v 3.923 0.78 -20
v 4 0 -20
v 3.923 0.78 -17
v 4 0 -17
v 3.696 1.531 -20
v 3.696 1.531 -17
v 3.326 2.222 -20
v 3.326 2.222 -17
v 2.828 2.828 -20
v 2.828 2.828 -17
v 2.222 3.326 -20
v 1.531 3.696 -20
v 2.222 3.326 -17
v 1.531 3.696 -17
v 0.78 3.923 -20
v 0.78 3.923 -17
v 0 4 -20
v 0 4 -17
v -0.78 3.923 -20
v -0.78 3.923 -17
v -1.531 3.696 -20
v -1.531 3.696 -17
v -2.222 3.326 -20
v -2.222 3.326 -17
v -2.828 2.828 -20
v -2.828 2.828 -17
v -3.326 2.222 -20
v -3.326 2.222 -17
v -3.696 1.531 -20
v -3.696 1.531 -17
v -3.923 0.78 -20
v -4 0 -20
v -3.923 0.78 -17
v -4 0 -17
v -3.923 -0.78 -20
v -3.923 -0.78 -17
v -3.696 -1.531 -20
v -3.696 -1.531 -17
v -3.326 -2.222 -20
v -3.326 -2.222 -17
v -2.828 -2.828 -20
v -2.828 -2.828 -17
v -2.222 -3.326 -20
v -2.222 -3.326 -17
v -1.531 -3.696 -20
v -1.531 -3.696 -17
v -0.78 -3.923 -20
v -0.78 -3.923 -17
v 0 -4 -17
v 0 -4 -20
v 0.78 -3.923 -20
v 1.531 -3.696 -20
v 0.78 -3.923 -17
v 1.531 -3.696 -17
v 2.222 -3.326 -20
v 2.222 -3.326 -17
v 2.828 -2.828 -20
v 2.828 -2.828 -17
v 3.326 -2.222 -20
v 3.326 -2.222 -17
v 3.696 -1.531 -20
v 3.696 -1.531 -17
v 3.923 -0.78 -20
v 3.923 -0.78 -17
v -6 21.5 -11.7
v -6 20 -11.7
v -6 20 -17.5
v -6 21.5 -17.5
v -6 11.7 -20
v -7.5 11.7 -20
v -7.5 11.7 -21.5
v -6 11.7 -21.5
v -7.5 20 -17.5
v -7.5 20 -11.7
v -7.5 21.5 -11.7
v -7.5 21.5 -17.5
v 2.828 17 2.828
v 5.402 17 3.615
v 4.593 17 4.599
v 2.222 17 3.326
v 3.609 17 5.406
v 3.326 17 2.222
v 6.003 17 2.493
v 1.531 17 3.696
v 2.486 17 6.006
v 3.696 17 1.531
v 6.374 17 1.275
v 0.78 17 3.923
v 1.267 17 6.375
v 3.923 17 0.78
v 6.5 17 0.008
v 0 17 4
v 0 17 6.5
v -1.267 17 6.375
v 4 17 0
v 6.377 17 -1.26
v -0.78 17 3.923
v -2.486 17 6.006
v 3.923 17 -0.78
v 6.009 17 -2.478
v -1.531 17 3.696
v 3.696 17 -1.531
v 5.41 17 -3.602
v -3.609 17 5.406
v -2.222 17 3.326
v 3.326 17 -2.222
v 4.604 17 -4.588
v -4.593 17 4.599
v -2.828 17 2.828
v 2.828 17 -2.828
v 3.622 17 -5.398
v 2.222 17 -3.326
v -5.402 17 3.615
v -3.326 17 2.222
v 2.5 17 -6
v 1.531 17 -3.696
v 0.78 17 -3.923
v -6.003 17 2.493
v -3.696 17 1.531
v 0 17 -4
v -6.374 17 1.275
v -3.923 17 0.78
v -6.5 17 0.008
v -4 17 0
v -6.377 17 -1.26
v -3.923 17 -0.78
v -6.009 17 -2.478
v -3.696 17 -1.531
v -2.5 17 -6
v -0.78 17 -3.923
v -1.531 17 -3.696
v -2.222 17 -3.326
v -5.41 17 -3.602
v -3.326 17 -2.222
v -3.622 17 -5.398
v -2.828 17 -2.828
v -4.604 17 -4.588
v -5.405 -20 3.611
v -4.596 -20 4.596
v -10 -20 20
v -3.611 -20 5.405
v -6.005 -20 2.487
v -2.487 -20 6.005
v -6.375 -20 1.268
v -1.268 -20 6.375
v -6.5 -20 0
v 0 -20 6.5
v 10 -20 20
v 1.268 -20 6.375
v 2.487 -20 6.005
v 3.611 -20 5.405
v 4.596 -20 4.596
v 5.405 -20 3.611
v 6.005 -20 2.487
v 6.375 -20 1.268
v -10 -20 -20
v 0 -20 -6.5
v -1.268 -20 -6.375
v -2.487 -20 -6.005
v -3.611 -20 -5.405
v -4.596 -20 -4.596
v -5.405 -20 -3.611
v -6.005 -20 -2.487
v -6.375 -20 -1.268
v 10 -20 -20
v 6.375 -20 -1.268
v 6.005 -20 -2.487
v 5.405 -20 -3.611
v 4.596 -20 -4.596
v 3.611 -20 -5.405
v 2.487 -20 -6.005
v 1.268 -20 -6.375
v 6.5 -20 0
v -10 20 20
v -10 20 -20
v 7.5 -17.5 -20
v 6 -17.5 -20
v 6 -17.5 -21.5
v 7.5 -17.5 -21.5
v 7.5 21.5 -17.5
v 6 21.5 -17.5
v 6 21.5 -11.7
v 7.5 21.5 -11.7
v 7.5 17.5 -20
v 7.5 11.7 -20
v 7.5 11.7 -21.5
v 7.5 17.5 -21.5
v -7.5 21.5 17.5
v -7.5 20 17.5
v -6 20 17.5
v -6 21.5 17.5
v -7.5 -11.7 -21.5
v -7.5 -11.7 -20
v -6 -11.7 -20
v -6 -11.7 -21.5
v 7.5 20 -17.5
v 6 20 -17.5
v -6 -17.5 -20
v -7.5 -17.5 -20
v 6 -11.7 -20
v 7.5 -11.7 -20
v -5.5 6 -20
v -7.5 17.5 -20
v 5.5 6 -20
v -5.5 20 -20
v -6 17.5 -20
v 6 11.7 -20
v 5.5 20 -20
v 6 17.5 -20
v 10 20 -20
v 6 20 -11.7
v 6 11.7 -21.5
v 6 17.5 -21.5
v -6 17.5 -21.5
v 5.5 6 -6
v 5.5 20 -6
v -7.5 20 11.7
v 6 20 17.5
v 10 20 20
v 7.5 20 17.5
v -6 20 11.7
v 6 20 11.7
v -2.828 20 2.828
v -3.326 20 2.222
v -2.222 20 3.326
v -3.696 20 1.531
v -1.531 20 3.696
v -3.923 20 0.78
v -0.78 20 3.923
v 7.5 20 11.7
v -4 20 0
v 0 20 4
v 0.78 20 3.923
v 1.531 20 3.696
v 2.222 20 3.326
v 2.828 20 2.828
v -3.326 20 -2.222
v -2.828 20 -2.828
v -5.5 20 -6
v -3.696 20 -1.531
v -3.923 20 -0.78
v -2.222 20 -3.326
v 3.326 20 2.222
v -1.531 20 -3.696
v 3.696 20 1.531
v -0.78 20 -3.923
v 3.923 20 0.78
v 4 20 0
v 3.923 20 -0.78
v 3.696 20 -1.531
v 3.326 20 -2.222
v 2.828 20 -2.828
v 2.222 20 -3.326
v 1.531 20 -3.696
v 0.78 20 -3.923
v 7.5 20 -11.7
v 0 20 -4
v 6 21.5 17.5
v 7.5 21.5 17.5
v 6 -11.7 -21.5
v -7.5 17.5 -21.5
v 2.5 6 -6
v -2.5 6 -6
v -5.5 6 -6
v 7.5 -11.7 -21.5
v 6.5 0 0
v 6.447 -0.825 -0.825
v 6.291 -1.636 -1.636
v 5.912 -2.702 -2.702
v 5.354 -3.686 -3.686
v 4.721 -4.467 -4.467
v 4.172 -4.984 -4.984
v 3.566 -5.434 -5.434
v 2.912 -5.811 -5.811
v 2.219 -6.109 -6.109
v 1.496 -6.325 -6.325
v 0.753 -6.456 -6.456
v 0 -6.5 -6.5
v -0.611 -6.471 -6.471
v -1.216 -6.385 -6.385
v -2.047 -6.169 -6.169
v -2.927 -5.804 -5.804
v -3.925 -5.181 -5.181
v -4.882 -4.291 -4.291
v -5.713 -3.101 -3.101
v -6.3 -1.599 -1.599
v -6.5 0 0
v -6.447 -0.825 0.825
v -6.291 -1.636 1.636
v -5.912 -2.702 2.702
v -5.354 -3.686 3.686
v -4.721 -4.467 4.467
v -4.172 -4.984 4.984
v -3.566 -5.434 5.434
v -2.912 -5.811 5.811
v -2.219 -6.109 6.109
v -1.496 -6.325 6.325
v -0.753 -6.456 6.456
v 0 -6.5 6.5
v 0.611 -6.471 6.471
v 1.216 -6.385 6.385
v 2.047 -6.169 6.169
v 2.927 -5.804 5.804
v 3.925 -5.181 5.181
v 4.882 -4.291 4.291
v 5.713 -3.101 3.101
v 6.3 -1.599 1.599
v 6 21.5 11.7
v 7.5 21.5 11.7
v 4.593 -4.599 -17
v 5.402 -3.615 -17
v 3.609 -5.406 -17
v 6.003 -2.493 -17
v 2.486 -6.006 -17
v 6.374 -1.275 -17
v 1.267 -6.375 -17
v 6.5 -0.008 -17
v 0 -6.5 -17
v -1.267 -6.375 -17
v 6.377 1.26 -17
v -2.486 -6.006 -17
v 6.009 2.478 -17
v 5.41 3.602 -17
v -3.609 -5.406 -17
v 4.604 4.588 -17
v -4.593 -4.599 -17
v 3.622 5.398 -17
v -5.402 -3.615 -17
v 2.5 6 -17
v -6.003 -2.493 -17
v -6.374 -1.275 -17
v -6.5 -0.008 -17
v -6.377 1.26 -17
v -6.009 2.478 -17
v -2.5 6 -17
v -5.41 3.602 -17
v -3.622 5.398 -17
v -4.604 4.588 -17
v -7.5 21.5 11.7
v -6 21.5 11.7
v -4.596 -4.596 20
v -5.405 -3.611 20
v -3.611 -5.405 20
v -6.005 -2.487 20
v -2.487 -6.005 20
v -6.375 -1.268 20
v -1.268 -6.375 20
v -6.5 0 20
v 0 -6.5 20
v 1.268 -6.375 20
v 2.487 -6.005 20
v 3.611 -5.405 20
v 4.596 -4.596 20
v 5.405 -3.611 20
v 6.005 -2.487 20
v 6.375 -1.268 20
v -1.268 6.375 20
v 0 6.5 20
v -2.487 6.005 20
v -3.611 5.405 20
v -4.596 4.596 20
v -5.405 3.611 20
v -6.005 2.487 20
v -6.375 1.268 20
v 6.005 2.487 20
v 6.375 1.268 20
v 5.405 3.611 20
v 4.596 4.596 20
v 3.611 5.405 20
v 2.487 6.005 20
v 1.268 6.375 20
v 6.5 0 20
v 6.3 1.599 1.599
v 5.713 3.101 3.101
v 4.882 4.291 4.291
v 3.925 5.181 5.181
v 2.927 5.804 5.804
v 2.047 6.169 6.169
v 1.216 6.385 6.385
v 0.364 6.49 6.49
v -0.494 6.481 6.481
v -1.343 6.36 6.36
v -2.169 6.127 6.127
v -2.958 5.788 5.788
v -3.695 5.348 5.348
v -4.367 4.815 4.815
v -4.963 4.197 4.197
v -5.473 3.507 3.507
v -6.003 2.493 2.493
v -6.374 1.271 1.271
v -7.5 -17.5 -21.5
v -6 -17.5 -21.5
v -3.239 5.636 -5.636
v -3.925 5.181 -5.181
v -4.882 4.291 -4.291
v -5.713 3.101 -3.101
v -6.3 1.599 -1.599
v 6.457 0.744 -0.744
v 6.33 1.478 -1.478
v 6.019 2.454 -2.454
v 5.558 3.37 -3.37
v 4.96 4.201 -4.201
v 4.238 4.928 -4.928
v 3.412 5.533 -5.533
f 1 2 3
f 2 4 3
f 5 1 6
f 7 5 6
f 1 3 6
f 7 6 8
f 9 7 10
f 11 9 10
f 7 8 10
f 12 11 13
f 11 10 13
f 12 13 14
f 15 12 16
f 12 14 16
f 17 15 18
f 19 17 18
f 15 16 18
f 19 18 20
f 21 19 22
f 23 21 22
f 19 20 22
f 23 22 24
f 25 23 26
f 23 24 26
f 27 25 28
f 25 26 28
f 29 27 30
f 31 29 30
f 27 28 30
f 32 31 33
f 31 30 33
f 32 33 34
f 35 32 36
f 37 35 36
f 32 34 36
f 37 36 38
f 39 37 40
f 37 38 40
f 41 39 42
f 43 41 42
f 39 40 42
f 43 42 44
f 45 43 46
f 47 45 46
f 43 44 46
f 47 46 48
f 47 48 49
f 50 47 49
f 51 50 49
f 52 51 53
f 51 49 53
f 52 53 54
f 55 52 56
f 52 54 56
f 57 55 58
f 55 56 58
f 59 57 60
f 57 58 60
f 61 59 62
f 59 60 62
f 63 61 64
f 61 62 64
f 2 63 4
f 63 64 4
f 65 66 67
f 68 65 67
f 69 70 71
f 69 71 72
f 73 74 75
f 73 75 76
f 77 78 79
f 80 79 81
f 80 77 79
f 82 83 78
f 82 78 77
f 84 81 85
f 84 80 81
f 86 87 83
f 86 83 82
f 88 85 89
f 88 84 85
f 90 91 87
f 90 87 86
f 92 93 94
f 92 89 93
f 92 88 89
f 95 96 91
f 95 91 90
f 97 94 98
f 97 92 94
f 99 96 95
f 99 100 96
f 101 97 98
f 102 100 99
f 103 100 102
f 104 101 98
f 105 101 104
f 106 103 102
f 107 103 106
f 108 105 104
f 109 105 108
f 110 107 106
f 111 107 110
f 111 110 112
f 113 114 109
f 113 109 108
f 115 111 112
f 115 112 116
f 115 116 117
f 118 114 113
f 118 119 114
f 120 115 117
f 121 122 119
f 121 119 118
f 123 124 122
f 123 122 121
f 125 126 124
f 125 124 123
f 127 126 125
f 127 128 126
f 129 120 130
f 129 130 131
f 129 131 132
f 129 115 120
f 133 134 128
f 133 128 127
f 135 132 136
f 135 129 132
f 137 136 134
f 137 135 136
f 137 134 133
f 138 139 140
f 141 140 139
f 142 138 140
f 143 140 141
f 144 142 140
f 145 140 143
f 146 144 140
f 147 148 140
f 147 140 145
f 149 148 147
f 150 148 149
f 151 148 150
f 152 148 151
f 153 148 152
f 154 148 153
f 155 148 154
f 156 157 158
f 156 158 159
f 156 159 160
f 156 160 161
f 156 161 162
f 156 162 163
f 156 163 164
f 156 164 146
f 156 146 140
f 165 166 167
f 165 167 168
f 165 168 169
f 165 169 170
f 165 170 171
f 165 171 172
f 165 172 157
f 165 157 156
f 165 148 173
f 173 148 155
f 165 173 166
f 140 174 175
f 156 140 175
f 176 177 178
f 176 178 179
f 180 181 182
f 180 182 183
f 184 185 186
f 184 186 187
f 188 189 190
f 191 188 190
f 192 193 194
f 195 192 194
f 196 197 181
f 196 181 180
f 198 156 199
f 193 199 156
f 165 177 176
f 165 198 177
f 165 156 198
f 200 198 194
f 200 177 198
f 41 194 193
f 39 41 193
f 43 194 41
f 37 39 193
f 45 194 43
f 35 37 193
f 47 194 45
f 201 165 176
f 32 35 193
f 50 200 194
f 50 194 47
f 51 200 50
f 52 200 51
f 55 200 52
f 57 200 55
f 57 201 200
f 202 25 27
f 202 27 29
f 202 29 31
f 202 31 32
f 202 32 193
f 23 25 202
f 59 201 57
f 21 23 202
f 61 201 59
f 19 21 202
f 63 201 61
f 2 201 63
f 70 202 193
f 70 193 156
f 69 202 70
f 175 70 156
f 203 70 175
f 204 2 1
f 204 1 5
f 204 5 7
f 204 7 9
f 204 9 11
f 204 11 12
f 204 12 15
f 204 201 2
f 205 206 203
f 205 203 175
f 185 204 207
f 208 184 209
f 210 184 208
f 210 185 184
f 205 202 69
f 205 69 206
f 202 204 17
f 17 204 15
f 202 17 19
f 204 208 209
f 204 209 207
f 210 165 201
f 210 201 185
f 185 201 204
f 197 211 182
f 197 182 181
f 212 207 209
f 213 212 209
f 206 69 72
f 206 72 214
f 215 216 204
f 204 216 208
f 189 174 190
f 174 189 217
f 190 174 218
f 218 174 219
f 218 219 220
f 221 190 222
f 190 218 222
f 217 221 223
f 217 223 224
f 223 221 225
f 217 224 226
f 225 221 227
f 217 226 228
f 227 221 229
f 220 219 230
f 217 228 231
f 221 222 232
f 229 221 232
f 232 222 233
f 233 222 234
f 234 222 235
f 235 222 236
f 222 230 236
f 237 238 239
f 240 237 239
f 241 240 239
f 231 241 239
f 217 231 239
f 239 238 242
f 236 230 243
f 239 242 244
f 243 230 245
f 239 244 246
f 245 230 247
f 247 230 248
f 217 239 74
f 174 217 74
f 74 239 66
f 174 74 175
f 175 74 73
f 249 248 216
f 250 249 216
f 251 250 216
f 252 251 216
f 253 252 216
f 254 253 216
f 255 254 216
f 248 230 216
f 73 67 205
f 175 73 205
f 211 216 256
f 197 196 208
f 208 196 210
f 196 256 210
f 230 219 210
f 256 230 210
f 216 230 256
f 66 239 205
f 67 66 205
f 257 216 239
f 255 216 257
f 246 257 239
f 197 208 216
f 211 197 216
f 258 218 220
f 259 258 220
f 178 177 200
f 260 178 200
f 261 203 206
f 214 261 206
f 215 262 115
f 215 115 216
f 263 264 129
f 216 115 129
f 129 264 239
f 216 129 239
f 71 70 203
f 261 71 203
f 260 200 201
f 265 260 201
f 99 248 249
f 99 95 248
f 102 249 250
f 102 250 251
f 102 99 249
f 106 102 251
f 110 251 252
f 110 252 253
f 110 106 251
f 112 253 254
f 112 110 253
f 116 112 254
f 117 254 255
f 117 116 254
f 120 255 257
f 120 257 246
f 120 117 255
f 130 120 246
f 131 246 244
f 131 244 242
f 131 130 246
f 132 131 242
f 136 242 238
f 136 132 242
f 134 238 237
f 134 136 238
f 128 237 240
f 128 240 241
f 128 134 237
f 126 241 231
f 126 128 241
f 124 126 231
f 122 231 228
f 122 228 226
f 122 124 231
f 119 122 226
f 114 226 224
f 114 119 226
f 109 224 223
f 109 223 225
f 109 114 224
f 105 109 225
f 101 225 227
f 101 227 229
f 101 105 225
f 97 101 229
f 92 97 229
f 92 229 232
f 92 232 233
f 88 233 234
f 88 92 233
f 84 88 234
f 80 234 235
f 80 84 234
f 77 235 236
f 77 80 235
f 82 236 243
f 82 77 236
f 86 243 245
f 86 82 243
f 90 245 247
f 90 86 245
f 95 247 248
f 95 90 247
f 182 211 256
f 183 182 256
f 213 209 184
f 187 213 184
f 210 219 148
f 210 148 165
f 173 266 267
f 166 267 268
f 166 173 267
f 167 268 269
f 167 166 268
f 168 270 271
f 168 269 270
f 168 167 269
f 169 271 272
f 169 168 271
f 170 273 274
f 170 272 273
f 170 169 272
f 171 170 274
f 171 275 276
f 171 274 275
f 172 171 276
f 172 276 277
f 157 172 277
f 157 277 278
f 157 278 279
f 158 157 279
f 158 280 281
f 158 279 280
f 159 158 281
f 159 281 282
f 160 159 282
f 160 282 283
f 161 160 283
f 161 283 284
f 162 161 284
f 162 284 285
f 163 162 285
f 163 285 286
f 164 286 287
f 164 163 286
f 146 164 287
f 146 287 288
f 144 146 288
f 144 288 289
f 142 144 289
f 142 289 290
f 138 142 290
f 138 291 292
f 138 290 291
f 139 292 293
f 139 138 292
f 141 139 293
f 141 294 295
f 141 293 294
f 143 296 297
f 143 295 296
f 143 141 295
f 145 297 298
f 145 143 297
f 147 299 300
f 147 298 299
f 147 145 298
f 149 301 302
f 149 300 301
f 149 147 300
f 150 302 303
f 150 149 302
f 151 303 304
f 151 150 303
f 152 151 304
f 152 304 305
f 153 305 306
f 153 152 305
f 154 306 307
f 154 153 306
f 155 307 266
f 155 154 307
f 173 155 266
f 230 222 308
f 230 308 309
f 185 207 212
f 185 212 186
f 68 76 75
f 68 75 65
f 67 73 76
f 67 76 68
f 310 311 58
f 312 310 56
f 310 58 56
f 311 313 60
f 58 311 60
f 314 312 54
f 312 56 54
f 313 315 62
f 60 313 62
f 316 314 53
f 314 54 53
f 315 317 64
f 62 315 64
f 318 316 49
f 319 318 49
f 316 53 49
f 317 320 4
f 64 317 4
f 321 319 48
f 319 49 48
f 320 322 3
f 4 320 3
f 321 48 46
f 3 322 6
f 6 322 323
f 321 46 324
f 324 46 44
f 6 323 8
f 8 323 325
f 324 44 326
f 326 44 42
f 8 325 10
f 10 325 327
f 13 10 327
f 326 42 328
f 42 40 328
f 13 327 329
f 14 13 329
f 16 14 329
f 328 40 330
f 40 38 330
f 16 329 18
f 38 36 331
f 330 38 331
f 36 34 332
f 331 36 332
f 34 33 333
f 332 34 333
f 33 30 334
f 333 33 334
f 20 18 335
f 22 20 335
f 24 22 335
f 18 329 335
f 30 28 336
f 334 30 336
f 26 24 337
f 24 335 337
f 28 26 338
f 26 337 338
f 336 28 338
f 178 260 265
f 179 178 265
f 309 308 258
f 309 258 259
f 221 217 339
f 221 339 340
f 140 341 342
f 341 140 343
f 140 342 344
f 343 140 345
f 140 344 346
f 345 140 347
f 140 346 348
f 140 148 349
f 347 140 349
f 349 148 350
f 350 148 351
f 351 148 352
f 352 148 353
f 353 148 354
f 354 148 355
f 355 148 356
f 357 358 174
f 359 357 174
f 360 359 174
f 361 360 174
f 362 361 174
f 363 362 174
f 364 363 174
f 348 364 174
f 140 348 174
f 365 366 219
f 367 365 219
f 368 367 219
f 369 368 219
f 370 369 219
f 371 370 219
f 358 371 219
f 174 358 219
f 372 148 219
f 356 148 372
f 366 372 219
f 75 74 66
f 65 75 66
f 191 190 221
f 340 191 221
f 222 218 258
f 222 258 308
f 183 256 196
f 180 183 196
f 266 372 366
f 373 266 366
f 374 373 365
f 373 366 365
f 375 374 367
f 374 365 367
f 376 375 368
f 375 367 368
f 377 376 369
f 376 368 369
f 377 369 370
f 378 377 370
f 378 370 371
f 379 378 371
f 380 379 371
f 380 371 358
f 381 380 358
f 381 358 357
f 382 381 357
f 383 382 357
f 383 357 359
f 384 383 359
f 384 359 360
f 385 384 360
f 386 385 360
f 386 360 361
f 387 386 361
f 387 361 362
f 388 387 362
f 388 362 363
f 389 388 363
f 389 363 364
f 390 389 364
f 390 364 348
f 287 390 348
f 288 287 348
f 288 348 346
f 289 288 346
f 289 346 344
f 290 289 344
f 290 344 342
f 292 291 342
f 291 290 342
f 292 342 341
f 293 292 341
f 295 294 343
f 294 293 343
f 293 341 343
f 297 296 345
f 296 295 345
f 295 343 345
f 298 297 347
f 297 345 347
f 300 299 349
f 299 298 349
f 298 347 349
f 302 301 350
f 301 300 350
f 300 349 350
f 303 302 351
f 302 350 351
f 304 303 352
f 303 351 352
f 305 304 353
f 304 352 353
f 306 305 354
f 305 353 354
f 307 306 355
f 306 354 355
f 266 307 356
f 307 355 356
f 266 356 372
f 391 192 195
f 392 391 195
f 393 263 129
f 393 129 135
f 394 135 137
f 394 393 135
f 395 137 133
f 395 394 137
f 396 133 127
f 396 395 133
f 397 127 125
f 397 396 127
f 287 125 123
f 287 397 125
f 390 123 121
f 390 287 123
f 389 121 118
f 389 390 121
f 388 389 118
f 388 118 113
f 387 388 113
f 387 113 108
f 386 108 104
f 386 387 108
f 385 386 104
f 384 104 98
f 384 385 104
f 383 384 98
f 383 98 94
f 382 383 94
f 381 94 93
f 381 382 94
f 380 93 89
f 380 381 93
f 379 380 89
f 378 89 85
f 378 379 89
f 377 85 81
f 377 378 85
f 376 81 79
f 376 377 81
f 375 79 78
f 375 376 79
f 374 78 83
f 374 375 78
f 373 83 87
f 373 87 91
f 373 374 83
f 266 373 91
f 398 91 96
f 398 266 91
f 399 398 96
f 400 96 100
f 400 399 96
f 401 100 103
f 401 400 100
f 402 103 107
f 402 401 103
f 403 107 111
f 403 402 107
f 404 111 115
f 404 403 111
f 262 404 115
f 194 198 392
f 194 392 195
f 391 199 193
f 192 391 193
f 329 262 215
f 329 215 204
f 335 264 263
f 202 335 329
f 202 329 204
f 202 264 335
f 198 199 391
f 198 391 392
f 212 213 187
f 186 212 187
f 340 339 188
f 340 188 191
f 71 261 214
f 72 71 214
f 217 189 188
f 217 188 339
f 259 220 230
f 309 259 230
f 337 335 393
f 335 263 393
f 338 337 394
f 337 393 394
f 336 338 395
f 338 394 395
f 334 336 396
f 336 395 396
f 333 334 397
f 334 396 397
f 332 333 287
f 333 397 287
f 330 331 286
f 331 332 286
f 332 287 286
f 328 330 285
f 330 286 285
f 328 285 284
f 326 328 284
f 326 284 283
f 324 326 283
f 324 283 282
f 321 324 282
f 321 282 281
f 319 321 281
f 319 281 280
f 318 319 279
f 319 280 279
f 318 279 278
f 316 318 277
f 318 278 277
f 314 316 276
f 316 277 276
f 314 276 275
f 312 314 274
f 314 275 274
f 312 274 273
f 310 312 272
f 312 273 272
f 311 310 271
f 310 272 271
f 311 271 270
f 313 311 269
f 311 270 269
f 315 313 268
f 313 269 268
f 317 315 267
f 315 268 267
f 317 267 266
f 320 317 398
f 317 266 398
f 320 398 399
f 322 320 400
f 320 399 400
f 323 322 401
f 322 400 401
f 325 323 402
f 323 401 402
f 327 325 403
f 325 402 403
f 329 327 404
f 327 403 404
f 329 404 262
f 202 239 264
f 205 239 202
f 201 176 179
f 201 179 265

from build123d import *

# Parameters (mm, degrees)
SKETCH_2_W               = 40
SKETCH_2_H               = 40
EXTRUDE_2_DEPTH          = 10
SKETCH_4_W               = 1.5
SKETCH_4_H               = 5.8
EXTRUDE_3_DEPTH          = 1.5
SKETCH_5_W               = 14
SKETCH_5_H               = 14
CUT_EXTRUDE_1_DEPTH      = 5.5
CUT_EXTRUDE_1_DEPTH_BACK = 5.5


with BuildPart() as part:
    # Эскиз2 → Бобышка-Вытянуть2 (new body, symmetric)
    with BuildSketch(Plane(origin=(0, 0, 0), x_dir=(0, 0, -1), z_dir=(1, 0, 0))):
        Rectangle(SKETCH_2_W, SKETCH_2_H)
    extrude(amount=EXTRUDE_2_DEPTH, both=True)

    # Эскиз3 → Вырез-Повернуть1 (revolve, cut)
    with BuildSketch(Plane.XY, mode=Mode.PRIVATE) as cut_revolve_1_sk:
        Polygon((-4, 20), (-4, 17), (-6.5, 17), (-6.5, -20), (0, -20), (0, 20), align=None)
    cut_revolve_1 = revolve(cut_revolve_1_sk.sketch.rotate(Axis((0, -20, 0), (0, 1, 0)), 180), axis=Axis((0, -20, 0), (0, 1, 0)), mode=Mode.SUBTRACT)  # turned: the seam where the file's is

    # Эскиз4 → Бобышка-Вытянуть3 (add)
    with BuildSketch(Plane(origin=(0, 20, 0), x_dir=(1, 0, 0), z_dir=(0, 1, 0))):
        with Locations((-6.75, -14.6)):
            Rectangle(SKETCH_4_W, SKETCH_4_H)
        with Locations((-6.75, 14.6)):
            Rectangle(SKETCH_4_W, SKETCH_4_H)
        with Locations((6.75, 14.6)):
            Rectangle(SKETCH_4_W, SKETCH_4_H)
        with Locations((6.75, -14.6)):
            Rectangle(SKETCH_4_W, SKETCH_4_H)
    extrude_3 = extrude(amount=EXTRUDE_3_DEPTH)

    # Зеркальное отражение1: Вырез-Повернуть1, Бобышка-Вытянуть3 across plane
    add(cut_revolve_1.mirror(Plane(origin=(0, 0, 0), x_dir=(0, -0.707106781, 0.707106781), z_dir=(0, 0.707106781, 0.707106781))), mode=Mode.SUBTRACT)
    add(extrude_3.mirror(Plane(origin=(0, 0, 0), x_dir=(0, -0.707106781, 0.707106781), z_dir=(0, 0.707106781, 0.707106781))))

    # Эскиз5 → Вырез-Вытянуть1 (cut, two sides)
    with BuildSketch(Plane(origin=(0, 0, 0), x_dir=(0, 0, -1), z_dir=(1, 0, 0))) as cut_extrude_1_sk:
        with Locations((13, 13)):
            Rectangle(SKETCH_5_W, SKETCH_5_H)
    extrude(amount=CUT_EXTRUDE_1_DEPTH, mode=Mode.SUBTRACT)
    extrude(cut_extrude_1_sk.sketch, amount=-CUT_EXTRUDE_1_DEPTH_BACK, mode=Mode.SUBTRACT)


solid = part.part
